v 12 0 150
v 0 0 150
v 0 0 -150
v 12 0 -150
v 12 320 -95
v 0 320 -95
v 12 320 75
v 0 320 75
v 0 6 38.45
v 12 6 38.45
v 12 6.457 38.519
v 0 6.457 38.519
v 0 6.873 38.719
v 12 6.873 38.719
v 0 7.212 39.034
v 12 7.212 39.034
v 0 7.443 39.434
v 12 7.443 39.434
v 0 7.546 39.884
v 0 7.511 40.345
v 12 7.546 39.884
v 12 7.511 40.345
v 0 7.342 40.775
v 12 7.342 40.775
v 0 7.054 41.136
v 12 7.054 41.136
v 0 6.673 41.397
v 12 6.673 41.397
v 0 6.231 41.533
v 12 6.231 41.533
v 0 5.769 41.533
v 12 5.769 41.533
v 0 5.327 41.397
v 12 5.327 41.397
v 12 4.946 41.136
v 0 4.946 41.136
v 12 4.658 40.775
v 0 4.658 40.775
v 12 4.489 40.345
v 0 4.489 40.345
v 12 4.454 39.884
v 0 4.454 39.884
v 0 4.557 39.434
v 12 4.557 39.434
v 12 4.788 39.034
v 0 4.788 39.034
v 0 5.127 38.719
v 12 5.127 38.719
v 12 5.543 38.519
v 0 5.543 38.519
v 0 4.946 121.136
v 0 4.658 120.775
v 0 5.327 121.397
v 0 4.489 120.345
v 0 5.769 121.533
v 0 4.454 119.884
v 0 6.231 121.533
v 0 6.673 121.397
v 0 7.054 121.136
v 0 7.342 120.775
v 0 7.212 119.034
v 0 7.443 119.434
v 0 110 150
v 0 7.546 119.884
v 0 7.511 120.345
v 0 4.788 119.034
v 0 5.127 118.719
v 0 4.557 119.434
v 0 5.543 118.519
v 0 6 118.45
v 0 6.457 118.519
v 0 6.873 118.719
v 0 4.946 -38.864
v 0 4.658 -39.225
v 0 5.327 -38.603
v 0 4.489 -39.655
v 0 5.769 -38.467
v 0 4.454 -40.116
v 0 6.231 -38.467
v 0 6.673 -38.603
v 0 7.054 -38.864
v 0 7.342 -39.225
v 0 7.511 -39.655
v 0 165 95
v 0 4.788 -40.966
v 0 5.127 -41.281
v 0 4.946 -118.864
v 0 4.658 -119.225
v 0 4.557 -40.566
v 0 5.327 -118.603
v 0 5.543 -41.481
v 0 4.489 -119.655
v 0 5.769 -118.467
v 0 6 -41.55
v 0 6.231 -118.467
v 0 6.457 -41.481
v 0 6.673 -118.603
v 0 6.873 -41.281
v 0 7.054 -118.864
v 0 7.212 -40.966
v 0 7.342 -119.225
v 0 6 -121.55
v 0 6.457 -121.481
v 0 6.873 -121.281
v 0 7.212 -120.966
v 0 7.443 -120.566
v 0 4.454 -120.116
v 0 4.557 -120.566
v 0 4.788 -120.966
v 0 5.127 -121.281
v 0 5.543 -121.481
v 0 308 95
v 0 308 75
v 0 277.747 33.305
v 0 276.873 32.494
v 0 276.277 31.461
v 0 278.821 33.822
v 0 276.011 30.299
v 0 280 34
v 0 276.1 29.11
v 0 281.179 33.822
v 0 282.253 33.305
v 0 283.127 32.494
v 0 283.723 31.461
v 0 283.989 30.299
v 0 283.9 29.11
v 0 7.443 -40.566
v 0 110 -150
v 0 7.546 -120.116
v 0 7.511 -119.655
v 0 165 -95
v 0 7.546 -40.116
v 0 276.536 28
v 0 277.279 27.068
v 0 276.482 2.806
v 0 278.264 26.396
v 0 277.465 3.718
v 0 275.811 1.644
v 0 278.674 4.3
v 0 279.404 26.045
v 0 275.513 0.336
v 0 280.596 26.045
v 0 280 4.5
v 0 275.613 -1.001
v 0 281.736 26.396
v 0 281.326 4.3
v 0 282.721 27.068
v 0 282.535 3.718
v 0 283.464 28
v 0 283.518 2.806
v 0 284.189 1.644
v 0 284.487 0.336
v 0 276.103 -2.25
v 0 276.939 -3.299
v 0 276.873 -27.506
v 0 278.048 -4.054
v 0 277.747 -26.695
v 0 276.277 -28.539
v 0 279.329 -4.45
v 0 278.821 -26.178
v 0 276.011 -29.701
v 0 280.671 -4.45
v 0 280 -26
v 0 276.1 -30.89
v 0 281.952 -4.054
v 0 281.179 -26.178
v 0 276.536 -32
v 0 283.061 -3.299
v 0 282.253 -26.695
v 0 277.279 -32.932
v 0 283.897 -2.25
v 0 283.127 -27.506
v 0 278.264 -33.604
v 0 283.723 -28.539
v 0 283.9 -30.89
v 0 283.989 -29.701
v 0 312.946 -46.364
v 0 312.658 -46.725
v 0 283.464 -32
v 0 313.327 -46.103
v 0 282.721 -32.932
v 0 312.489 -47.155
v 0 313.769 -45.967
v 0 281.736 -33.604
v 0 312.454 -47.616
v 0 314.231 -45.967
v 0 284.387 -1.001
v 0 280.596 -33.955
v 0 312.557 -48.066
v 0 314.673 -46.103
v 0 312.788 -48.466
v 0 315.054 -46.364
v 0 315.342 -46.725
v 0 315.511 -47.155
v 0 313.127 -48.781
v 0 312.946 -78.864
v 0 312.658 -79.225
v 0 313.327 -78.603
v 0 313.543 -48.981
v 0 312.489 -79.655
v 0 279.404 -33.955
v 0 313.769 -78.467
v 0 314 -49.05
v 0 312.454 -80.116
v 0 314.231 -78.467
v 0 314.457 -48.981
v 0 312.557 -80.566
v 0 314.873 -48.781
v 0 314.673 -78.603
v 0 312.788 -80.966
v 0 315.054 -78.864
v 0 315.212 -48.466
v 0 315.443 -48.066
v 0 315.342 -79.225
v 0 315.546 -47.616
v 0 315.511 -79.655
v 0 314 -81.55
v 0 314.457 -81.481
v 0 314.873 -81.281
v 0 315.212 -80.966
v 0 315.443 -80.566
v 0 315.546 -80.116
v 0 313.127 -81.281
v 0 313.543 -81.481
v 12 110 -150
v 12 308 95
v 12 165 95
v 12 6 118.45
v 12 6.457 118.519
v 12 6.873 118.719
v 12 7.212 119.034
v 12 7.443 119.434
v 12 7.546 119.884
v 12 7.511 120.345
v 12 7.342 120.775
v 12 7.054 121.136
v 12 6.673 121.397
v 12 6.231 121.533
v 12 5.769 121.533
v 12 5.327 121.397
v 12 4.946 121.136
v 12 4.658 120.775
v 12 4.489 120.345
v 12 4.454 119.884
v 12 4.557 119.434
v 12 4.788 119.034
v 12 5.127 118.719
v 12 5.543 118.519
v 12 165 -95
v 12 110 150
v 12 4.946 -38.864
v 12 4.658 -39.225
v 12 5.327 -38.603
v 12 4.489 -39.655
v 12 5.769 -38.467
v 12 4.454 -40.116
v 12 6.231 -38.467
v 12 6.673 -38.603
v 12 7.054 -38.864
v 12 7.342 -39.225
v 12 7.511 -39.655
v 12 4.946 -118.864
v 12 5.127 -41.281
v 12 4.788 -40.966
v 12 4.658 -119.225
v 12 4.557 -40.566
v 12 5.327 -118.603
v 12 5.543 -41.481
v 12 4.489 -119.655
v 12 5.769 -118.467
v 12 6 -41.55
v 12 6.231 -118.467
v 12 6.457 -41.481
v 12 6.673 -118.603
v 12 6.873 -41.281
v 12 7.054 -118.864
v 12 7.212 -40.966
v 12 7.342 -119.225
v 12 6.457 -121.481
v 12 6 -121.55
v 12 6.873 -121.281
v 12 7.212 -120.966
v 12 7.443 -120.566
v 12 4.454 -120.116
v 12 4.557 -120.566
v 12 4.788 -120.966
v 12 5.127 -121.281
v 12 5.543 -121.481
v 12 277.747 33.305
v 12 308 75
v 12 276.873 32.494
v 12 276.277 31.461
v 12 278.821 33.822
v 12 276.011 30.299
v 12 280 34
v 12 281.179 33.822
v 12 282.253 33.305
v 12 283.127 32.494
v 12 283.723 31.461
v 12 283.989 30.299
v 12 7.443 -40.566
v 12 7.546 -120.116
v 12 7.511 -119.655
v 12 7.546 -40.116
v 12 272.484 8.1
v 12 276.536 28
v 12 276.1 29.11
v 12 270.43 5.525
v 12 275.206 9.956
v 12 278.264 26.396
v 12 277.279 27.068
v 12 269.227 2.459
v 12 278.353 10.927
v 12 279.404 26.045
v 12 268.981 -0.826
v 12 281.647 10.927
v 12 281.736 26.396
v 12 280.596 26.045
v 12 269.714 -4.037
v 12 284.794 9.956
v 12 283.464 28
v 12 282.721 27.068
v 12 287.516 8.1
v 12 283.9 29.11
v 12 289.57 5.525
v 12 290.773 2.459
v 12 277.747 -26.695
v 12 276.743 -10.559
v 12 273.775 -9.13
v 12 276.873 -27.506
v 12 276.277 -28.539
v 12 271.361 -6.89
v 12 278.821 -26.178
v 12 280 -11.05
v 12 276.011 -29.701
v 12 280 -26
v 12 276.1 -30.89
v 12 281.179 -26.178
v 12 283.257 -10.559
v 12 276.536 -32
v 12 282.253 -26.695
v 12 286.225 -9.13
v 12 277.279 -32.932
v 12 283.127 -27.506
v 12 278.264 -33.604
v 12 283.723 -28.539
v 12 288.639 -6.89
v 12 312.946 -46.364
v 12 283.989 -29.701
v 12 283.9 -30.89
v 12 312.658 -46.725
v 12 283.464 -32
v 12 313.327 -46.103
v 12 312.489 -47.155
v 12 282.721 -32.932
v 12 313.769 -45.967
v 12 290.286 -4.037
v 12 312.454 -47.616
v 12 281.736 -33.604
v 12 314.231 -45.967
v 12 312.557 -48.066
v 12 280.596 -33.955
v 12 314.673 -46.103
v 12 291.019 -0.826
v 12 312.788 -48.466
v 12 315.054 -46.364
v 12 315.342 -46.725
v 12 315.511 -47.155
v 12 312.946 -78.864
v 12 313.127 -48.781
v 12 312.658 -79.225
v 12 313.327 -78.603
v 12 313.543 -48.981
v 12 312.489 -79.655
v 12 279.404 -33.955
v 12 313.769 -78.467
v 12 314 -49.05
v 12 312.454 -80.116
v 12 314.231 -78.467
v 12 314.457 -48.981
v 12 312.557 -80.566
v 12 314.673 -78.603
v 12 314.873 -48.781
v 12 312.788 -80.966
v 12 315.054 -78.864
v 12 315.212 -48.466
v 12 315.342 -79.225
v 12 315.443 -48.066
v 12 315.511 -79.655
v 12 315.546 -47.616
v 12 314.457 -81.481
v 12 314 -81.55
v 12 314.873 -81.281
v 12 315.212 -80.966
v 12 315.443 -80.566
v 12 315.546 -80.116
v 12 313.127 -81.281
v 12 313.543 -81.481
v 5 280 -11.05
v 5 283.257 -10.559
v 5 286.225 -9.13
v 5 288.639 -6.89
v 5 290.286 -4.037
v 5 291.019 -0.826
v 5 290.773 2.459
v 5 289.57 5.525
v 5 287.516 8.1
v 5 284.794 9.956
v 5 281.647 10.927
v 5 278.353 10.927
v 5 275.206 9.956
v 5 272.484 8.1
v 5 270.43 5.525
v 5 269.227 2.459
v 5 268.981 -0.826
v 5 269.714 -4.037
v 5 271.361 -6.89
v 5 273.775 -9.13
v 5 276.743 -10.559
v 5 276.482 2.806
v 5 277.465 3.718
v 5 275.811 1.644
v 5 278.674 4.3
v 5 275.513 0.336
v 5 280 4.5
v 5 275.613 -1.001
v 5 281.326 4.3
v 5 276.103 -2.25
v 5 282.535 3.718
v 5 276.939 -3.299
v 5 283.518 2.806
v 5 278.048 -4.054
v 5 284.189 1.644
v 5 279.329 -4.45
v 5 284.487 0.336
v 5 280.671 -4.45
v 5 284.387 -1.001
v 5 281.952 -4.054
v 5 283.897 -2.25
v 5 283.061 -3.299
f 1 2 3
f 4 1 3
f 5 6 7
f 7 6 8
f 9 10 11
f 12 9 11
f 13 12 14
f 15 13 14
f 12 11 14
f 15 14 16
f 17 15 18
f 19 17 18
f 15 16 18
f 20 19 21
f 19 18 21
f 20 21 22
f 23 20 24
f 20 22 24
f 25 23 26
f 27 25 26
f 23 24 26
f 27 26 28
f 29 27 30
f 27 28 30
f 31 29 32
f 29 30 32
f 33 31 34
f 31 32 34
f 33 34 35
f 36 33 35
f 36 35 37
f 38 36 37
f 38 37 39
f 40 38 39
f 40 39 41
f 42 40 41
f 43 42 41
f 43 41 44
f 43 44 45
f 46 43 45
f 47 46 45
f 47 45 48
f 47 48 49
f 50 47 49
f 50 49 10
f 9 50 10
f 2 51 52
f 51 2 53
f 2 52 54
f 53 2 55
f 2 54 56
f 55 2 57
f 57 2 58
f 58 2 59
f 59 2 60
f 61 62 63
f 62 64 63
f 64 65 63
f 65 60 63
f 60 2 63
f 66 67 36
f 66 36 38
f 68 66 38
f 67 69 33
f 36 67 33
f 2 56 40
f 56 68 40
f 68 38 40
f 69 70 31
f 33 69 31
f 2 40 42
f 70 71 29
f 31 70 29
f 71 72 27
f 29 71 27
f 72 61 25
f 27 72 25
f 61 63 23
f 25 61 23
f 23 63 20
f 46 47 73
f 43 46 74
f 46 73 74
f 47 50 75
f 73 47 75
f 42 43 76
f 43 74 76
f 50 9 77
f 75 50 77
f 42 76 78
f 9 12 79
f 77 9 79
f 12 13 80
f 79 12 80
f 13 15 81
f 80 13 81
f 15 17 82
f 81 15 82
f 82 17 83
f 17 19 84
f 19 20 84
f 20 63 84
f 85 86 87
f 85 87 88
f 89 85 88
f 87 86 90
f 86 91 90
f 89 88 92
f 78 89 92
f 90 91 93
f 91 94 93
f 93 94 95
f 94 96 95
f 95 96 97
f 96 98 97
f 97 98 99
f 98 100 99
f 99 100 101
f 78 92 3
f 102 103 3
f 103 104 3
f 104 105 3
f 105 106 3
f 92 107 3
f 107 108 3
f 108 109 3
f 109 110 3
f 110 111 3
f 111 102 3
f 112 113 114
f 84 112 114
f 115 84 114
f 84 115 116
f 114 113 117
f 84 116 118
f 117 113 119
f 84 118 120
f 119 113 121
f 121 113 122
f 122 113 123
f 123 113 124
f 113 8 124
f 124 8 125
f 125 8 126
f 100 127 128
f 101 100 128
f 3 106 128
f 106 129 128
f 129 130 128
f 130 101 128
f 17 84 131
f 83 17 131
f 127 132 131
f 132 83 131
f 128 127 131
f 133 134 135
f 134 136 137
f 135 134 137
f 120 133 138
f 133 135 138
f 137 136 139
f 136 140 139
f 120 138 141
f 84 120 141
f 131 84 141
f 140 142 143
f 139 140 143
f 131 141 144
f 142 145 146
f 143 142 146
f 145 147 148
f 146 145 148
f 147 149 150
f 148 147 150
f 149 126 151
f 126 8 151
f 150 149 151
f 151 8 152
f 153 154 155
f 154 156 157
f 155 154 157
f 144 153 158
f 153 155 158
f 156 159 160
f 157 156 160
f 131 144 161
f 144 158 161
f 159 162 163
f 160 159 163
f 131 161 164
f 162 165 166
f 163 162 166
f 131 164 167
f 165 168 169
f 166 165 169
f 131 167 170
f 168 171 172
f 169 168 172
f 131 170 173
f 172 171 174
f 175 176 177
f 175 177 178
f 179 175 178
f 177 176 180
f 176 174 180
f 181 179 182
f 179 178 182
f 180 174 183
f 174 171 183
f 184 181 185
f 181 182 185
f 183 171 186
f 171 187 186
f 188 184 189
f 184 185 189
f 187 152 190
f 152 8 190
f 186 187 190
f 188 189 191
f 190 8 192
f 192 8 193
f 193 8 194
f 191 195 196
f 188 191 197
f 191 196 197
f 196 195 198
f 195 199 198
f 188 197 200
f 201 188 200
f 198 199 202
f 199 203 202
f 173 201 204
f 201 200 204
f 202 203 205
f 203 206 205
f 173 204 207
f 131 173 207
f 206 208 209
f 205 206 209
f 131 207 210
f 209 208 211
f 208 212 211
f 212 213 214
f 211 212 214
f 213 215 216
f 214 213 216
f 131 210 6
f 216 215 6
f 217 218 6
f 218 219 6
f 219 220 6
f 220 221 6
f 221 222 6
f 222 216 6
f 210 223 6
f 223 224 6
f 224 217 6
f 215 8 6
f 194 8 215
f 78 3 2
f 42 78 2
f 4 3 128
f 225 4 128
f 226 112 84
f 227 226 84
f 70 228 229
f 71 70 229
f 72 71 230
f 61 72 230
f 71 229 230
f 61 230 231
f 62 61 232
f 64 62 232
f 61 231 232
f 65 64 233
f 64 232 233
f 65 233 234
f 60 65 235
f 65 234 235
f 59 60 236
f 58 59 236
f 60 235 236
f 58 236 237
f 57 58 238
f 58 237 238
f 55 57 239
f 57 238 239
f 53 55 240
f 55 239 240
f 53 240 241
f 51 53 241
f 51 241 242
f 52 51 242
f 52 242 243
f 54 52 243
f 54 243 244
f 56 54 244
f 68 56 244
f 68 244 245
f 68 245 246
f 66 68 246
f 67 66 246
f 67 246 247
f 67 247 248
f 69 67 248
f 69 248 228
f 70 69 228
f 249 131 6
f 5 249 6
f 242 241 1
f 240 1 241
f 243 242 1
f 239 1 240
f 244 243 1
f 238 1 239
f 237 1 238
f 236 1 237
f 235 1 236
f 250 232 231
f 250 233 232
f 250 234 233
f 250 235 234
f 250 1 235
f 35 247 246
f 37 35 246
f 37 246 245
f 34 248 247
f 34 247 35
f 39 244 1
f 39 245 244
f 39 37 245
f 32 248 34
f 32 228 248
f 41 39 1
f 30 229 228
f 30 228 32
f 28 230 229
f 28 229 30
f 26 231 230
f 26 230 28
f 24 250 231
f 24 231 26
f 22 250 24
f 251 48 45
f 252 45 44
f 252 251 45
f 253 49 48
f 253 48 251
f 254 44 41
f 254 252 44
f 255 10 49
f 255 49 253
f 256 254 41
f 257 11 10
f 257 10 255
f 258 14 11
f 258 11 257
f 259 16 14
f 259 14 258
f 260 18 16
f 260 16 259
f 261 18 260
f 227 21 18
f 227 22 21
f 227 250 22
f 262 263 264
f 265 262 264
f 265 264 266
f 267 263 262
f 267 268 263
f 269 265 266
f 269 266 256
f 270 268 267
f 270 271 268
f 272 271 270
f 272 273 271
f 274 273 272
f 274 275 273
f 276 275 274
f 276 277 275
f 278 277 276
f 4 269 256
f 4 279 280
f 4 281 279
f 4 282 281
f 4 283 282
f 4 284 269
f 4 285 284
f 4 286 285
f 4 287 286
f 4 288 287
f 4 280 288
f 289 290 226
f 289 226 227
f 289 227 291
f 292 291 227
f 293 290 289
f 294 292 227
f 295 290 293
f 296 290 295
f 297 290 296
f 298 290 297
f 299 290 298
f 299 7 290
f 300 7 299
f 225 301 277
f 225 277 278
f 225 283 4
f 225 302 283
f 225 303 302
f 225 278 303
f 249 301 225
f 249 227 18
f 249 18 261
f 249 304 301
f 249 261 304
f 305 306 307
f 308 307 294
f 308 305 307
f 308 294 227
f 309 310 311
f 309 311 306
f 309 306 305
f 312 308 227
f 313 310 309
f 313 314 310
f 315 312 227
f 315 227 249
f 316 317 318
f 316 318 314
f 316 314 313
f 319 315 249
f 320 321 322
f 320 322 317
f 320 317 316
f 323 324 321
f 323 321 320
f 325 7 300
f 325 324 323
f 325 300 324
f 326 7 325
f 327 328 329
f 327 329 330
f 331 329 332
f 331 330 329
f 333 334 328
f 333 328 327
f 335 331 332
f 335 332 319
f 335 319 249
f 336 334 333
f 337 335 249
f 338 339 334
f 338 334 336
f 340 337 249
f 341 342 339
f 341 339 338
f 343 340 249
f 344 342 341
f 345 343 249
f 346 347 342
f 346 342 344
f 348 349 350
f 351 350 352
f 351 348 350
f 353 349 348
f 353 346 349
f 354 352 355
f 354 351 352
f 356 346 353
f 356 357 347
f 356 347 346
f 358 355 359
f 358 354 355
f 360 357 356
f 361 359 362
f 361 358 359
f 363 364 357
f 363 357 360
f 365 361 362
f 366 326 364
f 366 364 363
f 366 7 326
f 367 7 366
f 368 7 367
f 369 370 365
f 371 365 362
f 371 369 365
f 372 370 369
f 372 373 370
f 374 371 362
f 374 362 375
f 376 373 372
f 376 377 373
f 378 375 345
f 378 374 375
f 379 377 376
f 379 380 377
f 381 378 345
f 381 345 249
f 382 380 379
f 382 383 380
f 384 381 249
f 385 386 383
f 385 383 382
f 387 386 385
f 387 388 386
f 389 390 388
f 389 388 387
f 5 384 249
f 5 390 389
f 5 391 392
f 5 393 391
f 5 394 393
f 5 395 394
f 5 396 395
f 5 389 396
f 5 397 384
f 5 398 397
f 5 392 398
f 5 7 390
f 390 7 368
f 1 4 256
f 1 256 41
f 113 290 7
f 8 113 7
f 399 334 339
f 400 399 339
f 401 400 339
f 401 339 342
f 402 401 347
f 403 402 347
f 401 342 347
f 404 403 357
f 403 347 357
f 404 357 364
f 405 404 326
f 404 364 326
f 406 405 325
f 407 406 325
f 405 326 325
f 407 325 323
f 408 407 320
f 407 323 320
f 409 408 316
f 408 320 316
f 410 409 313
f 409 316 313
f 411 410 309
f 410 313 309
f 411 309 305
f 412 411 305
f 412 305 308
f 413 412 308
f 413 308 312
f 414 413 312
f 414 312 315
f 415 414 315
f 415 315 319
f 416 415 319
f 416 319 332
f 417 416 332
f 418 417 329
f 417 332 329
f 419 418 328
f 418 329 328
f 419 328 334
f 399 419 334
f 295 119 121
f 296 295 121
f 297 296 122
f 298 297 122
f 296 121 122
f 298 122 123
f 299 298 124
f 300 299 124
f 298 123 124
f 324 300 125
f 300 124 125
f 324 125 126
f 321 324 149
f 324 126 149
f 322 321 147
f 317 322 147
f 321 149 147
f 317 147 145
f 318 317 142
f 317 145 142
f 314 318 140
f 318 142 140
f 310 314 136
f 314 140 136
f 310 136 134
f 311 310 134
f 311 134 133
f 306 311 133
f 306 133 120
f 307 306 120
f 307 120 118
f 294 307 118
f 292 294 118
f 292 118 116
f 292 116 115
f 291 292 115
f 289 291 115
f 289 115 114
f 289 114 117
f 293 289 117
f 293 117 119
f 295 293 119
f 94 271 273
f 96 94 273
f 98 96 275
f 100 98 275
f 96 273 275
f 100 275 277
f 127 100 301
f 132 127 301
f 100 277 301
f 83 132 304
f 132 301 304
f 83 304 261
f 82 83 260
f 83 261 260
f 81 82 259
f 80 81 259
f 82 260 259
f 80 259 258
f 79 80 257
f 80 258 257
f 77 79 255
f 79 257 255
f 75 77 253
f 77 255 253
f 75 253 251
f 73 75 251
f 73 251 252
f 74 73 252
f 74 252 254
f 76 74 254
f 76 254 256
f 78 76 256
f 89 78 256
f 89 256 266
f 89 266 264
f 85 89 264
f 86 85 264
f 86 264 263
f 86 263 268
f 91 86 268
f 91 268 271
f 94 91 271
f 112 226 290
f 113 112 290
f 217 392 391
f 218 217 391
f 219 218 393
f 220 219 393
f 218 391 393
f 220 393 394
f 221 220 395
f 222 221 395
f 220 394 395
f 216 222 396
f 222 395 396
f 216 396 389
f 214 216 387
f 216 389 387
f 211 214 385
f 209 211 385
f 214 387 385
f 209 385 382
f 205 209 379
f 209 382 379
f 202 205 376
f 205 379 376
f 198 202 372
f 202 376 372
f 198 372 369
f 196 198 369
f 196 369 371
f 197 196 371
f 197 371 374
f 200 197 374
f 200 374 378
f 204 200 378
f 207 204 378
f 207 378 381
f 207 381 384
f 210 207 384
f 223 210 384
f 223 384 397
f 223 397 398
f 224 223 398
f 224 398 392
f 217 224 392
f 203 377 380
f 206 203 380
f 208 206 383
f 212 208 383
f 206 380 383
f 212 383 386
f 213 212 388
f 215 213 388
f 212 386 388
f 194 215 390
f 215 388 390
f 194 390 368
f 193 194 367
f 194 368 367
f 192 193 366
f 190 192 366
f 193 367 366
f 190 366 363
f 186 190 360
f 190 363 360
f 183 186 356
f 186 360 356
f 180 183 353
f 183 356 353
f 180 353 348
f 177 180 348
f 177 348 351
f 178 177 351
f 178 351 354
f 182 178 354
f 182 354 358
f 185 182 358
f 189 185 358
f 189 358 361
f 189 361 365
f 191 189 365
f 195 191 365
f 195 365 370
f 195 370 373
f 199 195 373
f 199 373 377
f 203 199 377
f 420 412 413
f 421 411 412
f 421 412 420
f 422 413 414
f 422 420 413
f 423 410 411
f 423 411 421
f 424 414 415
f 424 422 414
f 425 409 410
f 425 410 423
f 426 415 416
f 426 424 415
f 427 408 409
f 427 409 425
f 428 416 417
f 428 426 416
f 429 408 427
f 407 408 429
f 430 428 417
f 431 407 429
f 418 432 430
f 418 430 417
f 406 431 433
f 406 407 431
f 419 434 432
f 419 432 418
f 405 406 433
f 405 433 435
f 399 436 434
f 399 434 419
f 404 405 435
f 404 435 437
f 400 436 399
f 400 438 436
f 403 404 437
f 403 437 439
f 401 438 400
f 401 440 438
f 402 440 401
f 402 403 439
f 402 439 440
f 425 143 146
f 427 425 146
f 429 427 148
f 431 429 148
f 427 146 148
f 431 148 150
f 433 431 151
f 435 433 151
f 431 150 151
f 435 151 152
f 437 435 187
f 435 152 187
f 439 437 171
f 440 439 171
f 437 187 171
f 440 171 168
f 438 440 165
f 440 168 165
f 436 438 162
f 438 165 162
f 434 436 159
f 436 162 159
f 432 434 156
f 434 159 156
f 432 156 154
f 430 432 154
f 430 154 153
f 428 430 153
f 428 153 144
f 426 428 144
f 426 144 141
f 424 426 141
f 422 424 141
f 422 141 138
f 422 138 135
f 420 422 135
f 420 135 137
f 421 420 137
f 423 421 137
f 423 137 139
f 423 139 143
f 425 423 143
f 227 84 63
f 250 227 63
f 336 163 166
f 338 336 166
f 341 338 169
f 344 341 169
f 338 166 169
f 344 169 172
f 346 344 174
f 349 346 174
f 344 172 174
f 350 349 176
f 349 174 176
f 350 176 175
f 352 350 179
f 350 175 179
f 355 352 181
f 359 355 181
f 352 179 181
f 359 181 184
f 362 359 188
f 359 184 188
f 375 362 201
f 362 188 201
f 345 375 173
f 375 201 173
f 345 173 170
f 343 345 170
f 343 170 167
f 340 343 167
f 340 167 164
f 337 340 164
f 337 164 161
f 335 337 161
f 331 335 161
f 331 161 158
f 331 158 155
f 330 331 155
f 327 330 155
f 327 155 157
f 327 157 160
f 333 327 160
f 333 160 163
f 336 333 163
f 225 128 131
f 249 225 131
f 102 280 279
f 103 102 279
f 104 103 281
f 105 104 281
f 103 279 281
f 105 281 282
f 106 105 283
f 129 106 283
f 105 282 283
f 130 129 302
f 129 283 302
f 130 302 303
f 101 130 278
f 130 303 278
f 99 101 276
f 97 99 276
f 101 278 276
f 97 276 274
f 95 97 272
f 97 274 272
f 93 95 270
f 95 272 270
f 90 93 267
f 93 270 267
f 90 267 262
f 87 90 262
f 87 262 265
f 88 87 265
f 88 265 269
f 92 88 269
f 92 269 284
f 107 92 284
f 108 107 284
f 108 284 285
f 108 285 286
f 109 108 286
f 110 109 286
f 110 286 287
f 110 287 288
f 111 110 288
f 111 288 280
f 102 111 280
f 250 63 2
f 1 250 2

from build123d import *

# Parameters (mm, degrees)
BOSS_EXTRUDE1_DEPTH = 12
SKETCH2_R           = 4
CUT_EXTRUDE1_DEPTH  = 13
SKETCH3_R           = 4.5
CUT_EXTRUDE2_DEPTH  = 13
SKETCH4_R           = 11.05
CUT_EXTRUDE3_DEPTH  = 7
SKETCH5_W           = 20
SKETCH5_H           = 12
CUT_EXTRUDE4_DEPTH  = 13
SKETCH6_R           = 1.55
CUT_EXTRUDE5_DEPTH  = 13


with BuildPart() as part:
    # Sketch1 → Boss-Extrude1 (new body)
    with BuildSketch(Plane(origin=(0, 0, 0), x_dir=(0, 0, -1), z_dir=(1, 0, 0))):
        Polygon((95, 320), (-95, 320), (-95, 165), (-150, 110), (-150, 0), (150, 0), (150, 110), (95, 165), align=None)
    extrude(amount=BOSS_EXTRUDE1_DEPTH)

    # Sketch2 → Cut-Extrude1 (cut, through all)
    with BuildSketch(Plane.ZY):
        with Locations((30, 280)):
            Circle(SKETCH2_R)
        with Locations((-30, 280)):
            Circle(SKETCH2_R)
    extrude(amount=-CUT_EXTRUDE1_DEPTH, mode=Mode.SUBTRACT)

    # Sketch3 → Cut-Extrude2 (cut, through all)
    with BuildSketch(Plane.ZY):
        with Locations((0, 280)):
            Circle(SKETCH3_R)
    extrude(amount=-CUT_EXTRUDE2_DEPTH, mode=Mode.SUBTRACT)

    # Sketch4 → Cut-Extrude3 (cut)
    with BuildSketch(Plane(origin=(12, 0, 0), x_dir=(0, 0, -1), z_dir=(1, 0, 0))):
        with Locations((0, 280)):
            Circle(SKETCH4_R)
    extrude(amount=-CUT_EXTRUDE3_DEPTH, mode=Mode.SUBTRACT)

    # Sketch5 → Cut-Extrude4 (cut, through all)
    with BuildSketch(Plane(origin=(12, 0, 0), x_dir=(0, 0, -1), z_dir=(1, 0, 0))):
        with Locations((-85, 314)):
            Rectangle(SKETCH5_W, SKETCH5_H)
    extrude(amount=-CUT_EXTRUDE4_DEPTH, mode=Mode.SUBTRACT)

    # Sketch6 → Cut-Extrude5 (cut, through all)
    with BuildSketch(Plane(origin=(12, 0, 0), x_dir=(0, 0, -1), z_dir=(1, 0, 0))):
        with Locations((-120, 6)):
            Circle(SKETCH6_R)
        with Locations((-40, 6)):
            Circle(SKETCH6_R)
        with Locations((40, 6)):
            Circle(SKETCH6_R)
        with Locations((120, 6)):
            Circle(SKETCH6_R)
        with Locations((80, 314)):
            Circle(SKETCH6_R)
        with Locations((47.5, 314)):
            Circle(SKETCH6_R)
    extrude(amount=-CUT_EXTRUDE5_DEPTH, mode=Mode.SUBTRACT)


solid = part.part
